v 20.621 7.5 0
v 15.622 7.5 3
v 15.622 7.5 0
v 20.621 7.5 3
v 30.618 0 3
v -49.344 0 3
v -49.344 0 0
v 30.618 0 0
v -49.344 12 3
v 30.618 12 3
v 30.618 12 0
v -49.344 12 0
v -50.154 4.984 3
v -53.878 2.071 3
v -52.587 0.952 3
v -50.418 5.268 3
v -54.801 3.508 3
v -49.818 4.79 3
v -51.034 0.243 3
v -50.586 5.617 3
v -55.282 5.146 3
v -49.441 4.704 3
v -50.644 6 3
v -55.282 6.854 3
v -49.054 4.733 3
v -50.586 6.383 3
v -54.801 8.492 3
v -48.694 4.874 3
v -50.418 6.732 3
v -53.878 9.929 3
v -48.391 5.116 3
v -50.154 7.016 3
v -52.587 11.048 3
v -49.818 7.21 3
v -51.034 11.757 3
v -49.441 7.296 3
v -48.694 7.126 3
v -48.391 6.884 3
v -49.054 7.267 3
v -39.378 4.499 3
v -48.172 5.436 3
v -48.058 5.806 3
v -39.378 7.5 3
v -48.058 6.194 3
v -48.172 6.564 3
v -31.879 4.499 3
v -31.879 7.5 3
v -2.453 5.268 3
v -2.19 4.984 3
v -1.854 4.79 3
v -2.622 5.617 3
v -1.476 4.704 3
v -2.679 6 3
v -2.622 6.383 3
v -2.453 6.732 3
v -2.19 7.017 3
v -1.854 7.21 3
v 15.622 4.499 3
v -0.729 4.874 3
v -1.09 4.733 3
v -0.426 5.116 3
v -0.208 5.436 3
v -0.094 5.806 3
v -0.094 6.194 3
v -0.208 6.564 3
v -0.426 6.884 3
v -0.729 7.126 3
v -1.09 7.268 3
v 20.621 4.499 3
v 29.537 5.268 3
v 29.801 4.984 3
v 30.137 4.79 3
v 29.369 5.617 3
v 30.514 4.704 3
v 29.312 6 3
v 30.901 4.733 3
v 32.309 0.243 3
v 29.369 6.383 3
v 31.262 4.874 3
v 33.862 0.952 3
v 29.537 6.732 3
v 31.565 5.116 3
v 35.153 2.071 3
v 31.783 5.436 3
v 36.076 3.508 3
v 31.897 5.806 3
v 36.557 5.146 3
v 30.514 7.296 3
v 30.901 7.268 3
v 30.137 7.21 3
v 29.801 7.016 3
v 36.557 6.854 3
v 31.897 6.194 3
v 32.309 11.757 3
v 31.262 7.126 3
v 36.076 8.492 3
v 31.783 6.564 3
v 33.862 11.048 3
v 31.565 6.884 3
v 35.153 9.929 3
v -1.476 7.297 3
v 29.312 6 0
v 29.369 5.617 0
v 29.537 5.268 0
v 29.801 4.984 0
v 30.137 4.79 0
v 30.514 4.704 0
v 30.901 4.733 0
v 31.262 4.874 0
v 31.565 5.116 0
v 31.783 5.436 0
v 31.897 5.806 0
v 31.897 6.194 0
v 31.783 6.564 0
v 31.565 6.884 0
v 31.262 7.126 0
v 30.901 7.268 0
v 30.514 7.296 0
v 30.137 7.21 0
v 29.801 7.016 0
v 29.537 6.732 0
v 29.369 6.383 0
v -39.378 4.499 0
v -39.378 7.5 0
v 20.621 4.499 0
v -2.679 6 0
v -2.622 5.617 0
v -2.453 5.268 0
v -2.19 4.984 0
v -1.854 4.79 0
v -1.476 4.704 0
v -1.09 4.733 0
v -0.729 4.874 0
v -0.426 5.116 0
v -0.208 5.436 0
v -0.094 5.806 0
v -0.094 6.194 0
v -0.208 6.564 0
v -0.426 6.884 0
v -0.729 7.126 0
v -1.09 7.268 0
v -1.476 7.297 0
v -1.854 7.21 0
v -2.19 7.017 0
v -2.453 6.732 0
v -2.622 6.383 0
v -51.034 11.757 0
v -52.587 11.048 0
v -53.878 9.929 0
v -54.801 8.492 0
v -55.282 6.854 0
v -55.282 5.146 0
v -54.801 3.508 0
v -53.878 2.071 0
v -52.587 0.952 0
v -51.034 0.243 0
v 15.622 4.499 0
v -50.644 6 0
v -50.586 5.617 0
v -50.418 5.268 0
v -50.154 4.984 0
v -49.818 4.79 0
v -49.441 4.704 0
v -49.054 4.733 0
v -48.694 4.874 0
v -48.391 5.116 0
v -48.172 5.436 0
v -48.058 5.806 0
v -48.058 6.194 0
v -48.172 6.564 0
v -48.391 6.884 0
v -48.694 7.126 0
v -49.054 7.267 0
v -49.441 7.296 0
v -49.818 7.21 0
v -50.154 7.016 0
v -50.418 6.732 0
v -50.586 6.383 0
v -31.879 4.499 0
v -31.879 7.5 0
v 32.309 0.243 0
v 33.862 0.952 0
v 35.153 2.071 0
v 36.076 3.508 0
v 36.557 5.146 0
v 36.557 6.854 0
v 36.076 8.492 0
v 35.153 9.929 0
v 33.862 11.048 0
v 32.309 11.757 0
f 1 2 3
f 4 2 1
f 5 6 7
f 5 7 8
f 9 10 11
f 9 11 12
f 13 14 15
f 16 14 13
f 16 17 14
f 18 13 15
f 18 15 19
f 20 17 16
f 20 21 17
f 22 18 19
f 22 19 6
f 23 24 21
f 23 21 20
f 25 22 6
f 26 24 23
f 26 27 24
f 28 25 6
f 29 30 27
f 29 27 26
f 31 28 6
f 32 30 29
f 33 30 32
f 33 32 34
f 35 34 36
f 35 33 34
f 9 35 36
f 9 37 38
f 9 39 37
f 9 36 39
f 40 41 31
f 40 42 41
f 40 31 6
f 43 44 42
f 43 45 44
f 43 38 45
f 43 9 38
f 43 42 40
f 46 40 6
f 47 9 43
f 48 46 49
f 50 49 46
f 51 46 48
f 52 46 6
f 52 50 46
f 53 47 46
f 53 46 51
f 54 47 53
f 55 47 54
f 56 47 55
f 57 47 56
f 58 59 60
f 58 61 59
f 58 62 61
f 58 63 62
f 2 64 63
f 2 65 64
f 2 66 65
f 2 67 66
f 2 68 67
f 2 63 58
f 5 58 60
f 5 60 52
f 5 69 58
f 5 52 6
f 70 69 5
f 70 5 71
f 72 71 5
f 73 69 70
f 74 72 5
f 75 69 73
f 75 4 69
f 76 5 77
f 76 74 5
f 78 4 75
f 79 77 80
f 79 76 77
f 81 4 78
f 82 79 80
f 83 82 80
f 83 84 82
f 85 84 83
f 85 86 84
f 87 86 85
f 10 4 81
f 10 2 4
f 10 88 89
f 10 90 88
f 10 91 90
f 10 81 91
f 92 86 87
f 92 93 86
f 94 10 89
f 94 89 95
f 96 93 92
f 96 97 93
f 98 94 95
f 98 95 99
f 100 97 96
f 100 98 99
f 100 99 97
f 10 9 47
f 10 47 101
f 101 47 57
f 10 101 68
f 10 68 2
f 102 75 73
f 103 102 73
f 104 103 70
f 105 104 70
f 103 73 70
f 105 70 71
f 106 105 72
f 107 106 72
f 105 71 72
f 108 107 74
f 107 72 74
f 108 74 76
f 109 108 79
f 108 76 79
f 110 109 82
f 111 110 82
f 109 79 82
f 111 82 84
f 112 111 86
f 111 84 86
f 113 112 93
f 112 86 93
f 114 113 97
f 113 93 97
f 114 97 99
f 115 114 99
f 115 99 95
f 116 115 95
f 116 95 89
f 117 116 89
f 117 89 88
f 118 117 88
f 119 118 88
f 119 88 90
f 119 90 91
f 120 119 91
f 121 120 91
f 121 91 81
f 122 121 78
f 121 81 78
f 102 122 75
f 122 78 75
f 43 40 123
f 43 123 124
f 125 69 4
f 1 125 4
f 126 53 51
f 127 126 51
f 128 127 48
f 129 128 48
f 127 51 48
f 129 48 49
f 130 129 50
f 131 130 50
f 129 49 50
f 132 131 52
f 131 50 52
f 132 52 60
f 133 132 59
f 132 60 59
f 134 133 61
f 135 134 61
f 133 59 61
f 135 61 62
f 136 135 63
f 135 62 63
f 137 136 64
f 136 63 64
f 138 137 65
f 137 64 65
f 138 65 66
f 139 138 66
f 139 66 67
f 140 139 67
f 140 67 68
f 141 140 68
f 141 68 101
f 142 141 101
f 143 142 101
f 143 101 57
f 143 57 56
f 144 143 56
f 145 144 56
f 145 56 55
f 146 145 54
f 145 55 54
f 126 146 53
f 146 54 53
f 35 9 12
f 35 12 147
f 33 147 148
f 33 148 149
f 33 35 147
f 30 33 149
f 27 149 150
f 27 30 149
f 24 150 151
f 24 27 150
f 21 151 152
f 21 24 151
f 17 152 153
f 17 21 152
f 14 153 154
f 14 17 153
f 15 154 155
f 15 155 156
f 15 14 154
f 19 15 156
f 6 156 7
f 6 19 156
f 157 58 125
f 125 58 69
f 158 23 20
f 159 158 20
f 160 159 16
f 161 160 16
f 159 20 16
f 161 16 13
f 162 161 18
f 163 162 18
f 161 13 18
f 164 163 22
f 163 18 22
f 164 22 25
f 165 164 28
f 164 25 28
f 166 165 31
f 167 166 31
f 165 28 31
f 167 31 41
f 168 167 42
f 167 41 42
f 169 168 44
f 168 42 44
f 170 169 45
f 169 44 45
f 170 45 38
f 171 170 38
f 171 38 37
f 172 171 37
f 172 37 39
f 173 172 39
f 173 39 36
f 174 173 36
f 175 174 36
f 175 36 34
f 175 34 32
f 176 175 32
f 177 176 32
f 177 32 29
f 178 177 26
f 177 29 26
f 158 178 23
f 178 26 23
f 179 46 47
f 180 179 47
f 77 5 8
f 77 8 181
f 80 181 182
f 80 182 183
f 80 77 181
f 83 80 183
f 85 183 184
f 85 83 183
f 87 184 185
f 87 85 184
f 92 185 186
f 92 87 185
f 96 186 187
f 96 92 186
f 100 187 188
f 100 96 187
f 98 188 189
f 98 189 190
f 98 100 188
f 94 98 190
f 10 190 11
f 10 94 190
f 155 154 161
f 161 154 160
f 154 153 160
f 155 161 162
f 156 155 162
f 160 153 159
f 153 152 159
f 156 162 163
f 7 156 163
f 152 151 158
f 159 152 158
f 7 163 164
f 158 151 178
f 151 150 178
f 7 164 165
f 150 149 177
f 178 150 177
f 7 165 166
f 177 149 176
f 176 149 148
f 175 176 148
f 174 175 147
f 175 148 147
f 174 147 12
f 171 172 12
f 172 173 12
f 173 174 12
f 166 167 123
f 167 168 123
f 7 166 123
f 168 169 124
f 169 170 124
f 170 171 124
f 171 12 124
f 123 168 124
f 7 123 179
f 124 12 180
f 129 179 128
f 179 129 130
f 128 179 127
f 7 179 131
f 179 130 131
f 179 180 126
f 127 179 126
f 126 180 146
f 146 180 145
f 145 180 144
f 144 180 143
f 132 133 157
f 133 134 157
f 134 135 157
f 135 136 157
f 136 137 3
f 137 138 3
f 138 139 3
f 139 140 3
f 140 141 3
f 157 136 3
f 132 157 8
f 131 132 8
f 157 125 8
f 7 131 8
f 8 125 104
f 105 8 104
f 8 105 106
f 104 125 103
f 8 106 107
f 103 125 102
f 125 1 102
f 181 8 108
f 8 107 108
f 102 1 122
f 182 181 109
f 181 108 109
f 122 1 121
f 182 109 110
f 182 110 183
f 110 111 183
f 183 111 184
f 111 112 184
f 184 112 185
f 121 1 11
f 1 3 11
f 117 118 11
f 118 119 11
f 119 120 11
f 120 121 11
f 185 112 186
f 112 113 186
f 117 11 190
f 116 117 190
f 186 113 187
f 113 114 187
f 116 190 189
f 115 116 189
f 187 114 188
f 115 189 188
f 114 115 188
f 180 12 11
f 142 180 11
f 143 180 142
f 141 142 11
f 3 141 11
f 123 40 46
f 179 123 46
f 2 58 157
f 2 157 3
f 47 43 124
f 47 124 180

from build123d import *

# Parameters (mm, degrees)
SKETCH_1_R      = 1.3
SKETCH_1_W      = 7.4992
SKETCH_1_H      = 3.0001
SKETCH_1_W_2    = 4.9995
EXTRUDE_1_DEPTH = 3


with BuildPart() as part:
    # 草图1 → 凸台-拉伸1 (new body)
    with BuildSketch(Plane.XY.offset(3)):
        with BuildLine():
            Line((-49.343510787, 0), (30.618171933, 0))
            ThreePointArc((30.618171933, 0), (36.618171933, 6), (30.618171933, 12))
            Line((30.618171933, 12), (-49.343510787, 12))
            ThreePointArc((-49.343510787, 12), (-55.343510787, 6), (-49.343510787, 0))
        make_face()
        with Locations(Location((30.611606698, 6.0001, 0), (0, 0, 180))):
            Circle(SKETCH_1_R, mode=Mode.SUBTRACT)
        with Locations(Location((-1.379286828, 6.00015, 0), (0, 0, 180))):
            Circle(SKETCH_1_R, mode=Mode.SUBTRACT)
        with Locations(Location((-49.343510787, 6, 0), (0, 0, 180))):
            Circle(SKETCH_1_R, mode=Mode.SUBTRACT)
        with Locations((-35.628693302, 5.99945)):
            Rectangle(SKETCH_1_W, SKETCH_1_H, mode=Mode.SUBTRACT)
        with Locations((18.121556698, 5.99945)):
            Rectangle(SKETCH_1_W_2, SKETCH_1_H, mode=Mode.SUBTRACT)
    extrude(amount=-EXTRUDE_1_DEPTH)


solid = part.part
